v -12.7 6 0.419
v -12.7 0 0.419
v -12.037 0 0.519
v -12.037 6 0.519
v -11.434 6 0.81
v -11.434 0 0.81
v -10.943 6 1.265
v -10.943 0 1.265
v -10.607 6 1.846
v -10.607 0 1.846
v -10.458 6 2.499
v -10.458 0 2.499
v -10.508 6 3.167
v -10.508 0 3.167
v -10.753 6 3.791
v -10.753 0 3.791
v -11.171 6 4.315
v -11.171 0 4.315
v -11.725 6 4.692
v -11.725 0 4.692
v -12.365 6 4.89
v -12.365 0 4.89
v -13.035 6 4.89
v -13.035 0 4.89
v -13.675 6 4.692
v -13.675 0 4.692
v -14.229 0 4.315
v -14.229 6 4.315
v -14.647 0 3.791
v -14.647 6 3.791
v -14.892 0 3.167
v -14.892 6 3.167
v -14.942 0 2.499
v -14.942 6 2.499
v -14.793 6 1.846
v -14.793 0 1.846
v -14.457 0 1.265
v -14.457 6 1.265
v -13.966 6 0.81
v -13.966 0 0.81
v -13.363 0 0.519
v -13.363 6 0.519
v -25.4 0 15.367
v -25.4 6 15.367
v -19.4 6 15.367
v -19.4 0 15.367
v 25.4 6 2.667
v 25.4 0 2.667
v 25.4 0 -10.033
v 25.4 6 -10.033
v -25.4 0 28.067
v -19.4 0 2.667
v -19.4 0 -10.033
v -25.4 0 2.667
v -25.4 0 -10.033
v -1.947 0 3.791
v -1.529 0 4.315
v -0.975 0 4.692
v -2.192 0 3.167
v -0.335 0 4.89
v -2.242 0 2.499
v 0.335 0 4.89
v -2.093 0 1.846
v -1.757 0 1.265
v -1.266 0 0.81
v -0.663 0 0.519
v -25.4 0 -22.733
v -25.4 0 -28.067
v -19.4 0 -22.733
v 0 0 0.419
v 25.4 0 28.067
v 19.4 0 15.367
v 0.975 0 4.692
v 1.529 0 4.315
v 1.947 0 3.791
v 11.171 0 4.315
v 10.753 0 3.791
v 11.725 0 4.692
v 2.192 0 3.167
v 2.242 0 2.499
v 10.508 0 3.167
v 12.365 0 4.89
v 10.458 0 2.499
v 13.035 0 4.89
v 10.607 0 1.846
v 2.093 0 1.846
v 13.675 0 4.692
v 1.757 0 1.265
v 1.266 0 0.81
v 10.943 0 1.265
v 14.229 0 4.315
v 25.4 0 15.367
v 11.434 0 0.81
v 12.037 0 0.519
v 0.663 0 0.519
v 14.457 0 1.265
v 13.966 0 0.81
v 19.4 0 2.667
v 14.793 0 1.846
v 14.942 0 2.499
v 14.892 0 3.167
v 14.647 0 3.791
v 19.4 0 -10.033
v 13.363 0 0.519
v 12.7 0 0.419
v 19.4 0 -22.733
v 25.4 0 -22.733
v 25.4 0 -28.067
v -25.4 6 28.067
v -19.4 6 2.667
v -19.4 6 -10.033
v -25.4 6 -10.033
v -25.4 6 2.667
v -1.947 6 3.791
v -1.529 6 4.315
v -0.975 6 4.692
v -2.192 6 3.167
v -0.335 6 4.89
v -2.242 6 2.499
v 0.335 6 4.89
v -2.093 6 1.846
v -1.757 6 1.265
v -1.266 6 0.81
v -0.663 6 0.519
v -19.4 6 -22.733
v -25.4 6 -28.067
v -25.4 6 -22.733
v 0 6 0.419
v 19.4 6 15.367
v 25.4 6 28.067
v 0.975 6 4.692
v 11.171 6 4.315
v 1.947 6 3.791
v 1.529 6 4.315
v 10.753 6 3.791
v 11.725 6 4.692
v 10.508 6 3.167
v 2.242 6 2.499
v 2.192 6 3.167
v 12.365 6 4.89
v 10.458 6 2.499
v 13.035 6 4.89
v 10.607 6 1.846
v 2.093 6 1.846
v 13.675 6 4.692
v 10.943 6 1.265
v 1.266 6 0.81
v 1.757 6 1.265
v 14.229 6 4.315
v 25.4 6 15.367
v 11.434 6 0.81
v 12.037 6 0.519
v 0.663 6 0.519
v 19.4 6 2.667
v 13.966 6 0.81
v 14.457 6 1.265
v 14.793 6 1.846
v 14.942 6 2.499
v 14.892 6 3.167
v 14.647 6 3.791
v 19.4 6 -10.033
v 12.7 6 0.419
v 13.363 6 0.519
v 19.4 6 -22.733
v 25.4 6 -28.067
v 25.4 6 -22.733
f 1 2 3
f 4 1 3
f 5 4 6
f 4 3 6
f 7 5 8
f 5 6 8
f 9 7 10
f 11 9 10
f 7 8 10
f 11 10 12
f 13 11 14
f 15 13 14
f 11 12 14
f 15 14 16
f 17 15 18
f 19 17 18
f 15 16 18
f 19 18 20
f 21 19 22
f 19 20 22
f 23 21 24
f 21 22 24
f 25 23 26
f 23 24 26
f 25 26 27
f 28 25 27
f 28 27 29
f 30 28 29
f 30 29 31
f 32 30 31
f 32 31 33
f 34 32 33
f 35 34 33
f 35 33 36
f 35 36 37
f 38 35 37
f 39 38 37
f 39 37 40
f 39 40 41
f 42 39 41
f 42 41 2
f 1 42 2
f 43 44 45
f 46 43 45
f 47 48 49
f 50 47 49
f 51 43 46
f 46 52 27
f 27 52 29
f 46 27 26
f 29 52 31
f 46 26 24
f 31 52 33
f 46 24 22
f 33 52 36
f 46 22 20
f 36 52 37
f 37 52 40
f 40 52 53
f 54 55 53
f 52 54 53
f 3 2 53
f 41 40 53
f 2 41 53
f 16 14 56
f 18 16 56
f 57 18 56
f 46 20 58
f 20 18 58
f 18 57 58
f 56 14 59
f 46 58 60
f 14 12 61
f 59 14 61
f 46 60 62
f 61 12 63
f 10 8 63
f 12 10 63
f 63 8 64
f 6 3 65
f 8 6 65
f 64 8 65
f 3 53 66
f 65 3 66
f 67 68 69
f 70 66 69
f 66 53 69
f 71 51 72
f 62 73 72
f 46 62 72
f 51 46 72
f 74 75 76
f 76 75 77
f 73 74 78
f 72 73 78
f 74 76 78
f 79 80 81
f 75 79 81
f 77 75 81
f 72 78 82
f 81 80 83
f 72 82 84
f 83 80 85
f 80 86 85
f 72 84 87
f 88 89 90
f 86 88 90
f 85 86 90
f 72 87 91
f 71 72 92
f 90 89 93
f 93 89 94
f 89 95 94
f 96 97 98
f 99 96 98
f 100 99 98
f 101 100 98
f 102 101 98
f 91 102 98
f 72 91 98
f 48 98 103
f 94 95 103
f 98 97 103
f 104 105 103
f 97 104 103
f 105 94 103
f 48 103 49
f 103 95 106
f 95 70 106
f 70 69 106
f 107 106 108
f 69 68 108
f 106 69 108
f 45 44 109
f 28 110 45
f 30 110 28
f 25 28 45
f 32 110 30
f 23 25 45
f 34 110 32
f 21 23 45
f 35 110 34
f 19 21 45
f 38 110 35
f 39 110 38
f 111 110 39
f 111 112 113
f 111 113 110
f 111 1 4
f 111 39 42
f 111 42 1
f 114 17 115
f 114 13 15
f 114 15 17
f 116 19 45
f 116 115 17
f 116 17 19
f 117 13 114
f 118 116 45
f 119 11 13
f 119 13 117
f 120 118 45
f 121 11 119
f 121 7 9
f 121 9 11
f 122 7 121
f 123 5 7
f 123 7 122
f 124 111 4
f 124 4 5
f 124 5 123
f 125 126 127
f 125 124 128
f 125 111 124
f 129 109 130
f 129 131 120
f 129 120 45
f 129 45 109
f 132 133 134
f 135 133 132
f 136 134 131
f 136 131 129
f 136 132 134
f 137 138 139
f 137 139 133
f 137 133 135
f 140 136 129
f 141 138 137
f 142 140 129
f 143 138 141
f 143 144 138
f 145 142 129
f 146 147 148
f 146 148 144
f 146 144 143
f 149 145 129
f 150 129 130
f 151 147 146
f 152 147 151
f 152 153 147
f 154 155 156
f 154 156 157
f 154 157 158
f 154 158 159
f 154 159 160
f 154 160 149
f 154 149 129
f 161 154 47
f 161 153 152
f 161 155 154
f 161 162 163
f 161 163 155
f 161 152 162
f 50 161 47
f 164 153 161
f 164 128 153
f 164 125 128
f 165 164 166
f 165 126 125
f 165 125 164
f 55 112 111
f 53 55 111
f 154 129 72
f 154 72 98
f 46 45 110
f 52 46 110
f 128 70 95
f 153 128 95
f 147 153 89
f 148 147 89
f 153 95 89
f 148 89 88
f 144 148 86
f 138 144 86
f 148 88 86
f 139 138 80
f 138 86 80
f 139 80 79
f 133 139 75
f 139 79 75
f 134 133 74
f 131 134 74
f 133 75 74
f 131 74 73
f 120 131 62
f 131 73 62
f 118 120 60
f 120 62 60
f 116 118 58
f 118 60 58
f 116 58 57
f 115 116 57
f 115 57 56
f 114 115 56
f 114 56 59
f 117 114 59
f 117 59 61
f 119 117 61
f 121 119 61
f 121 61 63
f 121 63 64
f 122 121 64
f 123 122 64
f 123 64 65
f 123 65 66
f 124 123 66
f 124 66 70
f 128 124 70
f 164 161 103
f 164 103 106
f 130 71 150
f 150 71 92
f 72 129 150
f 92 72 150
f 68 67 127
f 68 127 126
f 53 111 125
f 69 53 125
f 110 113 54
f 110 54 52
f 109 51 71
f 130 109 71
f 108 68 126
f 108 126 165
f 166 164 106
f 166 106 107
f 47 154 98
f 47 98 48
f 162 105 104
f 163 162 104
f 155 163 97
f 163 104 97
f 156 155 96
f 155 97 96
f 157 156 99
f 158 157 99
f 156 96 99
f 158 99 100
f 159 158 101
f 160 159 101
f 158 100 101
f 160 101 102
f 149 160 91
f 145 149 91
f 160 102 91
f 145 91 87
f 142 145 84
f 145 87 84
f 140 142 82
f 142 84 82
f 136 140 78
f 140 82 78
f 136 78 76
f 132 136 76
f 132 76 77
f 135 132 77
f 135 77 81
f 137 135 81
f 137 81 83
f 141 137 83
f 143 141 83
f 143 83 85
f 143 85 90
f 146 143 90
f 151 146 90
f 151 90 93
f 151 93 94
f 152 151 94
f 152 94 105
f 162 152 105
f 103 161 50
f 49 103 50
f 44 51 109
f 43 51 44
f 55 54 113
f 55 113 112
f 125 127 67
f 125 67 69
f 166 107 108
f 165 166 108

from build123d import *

# Parameters (mm, degrees)
SKETCH1_W            = 50.8
SKETCH1_H            = 56.134
MAIN_DEPTH           = 6
SKETCH2_W            = 6
SKETCH2_H            = 12.7
ACRYLIC_MOUNTS_DEPTH = 39.326446339
SKETCH3_R            = 2.2479
CUT_EXTRUDE1_DEPTH   = 39.326446339


with BuildPart() as part:
    # Sketch1 → Main (new body)
    with BuildSketch(Plane(origin=(0, 0, 0), x_dir=(1, 0, 0), z_dir=(0, 1, 0))):
        Rectangle(SKETCH1_W, SKETCH1_H)
    extrude(amount=MAIN_DEPTH)

    # Sketch2 → Acrylic Mounts (cut, through all)
    with BuildSketch(Plane(origin=(0, 6, 0), x_dir=(1, 0, 0), z_dir=(0, 1, 0))):
        with Locations((-22.4, -9.017)):
            Rectangle(SKETCH2_W, SKETCH2_H)
        with Locations((-22.4, 16.383)):
            Rectangle(SKETCH2_W, SKETCH2_H)
        with Locations((22.4, 16.383)):
            Rectangle(SKETCH2_W, SKETCH2_H)
        with Locations((22.4, -9.017)):
            Rectangle(SKETCH2_W, SKETCH2_H)
    extrude(amount=-ACRYLIC_MOUNTS_DEPTH, mode=Mode.SUBTRACT)

    # Sketch3 → Cut-Extrude1 (cut, through all)
    with BuildSketch(Plane(origin=(0, 0, 0), x_dir=(-1, 0, 0), z_dir=(0, -1, 0))):
        with Locations(Location((12.7, -2.667, 0), (0, 0, 90))):
            Circle(SKETCH3_R)
        with Locations(Location((-12.7, -2.667, 0), (0, 0, 90))):
            Circle(SKETCH3_R)
        with Locations(Location((0, -2.667, 0), (0, 0, 90))):
            Circle(SKETCH3_R)
    extrude(amount=-CUT_EXTRUDE1_DEPTH, mode=Mode.SUBTRACT)


solid = part.part
